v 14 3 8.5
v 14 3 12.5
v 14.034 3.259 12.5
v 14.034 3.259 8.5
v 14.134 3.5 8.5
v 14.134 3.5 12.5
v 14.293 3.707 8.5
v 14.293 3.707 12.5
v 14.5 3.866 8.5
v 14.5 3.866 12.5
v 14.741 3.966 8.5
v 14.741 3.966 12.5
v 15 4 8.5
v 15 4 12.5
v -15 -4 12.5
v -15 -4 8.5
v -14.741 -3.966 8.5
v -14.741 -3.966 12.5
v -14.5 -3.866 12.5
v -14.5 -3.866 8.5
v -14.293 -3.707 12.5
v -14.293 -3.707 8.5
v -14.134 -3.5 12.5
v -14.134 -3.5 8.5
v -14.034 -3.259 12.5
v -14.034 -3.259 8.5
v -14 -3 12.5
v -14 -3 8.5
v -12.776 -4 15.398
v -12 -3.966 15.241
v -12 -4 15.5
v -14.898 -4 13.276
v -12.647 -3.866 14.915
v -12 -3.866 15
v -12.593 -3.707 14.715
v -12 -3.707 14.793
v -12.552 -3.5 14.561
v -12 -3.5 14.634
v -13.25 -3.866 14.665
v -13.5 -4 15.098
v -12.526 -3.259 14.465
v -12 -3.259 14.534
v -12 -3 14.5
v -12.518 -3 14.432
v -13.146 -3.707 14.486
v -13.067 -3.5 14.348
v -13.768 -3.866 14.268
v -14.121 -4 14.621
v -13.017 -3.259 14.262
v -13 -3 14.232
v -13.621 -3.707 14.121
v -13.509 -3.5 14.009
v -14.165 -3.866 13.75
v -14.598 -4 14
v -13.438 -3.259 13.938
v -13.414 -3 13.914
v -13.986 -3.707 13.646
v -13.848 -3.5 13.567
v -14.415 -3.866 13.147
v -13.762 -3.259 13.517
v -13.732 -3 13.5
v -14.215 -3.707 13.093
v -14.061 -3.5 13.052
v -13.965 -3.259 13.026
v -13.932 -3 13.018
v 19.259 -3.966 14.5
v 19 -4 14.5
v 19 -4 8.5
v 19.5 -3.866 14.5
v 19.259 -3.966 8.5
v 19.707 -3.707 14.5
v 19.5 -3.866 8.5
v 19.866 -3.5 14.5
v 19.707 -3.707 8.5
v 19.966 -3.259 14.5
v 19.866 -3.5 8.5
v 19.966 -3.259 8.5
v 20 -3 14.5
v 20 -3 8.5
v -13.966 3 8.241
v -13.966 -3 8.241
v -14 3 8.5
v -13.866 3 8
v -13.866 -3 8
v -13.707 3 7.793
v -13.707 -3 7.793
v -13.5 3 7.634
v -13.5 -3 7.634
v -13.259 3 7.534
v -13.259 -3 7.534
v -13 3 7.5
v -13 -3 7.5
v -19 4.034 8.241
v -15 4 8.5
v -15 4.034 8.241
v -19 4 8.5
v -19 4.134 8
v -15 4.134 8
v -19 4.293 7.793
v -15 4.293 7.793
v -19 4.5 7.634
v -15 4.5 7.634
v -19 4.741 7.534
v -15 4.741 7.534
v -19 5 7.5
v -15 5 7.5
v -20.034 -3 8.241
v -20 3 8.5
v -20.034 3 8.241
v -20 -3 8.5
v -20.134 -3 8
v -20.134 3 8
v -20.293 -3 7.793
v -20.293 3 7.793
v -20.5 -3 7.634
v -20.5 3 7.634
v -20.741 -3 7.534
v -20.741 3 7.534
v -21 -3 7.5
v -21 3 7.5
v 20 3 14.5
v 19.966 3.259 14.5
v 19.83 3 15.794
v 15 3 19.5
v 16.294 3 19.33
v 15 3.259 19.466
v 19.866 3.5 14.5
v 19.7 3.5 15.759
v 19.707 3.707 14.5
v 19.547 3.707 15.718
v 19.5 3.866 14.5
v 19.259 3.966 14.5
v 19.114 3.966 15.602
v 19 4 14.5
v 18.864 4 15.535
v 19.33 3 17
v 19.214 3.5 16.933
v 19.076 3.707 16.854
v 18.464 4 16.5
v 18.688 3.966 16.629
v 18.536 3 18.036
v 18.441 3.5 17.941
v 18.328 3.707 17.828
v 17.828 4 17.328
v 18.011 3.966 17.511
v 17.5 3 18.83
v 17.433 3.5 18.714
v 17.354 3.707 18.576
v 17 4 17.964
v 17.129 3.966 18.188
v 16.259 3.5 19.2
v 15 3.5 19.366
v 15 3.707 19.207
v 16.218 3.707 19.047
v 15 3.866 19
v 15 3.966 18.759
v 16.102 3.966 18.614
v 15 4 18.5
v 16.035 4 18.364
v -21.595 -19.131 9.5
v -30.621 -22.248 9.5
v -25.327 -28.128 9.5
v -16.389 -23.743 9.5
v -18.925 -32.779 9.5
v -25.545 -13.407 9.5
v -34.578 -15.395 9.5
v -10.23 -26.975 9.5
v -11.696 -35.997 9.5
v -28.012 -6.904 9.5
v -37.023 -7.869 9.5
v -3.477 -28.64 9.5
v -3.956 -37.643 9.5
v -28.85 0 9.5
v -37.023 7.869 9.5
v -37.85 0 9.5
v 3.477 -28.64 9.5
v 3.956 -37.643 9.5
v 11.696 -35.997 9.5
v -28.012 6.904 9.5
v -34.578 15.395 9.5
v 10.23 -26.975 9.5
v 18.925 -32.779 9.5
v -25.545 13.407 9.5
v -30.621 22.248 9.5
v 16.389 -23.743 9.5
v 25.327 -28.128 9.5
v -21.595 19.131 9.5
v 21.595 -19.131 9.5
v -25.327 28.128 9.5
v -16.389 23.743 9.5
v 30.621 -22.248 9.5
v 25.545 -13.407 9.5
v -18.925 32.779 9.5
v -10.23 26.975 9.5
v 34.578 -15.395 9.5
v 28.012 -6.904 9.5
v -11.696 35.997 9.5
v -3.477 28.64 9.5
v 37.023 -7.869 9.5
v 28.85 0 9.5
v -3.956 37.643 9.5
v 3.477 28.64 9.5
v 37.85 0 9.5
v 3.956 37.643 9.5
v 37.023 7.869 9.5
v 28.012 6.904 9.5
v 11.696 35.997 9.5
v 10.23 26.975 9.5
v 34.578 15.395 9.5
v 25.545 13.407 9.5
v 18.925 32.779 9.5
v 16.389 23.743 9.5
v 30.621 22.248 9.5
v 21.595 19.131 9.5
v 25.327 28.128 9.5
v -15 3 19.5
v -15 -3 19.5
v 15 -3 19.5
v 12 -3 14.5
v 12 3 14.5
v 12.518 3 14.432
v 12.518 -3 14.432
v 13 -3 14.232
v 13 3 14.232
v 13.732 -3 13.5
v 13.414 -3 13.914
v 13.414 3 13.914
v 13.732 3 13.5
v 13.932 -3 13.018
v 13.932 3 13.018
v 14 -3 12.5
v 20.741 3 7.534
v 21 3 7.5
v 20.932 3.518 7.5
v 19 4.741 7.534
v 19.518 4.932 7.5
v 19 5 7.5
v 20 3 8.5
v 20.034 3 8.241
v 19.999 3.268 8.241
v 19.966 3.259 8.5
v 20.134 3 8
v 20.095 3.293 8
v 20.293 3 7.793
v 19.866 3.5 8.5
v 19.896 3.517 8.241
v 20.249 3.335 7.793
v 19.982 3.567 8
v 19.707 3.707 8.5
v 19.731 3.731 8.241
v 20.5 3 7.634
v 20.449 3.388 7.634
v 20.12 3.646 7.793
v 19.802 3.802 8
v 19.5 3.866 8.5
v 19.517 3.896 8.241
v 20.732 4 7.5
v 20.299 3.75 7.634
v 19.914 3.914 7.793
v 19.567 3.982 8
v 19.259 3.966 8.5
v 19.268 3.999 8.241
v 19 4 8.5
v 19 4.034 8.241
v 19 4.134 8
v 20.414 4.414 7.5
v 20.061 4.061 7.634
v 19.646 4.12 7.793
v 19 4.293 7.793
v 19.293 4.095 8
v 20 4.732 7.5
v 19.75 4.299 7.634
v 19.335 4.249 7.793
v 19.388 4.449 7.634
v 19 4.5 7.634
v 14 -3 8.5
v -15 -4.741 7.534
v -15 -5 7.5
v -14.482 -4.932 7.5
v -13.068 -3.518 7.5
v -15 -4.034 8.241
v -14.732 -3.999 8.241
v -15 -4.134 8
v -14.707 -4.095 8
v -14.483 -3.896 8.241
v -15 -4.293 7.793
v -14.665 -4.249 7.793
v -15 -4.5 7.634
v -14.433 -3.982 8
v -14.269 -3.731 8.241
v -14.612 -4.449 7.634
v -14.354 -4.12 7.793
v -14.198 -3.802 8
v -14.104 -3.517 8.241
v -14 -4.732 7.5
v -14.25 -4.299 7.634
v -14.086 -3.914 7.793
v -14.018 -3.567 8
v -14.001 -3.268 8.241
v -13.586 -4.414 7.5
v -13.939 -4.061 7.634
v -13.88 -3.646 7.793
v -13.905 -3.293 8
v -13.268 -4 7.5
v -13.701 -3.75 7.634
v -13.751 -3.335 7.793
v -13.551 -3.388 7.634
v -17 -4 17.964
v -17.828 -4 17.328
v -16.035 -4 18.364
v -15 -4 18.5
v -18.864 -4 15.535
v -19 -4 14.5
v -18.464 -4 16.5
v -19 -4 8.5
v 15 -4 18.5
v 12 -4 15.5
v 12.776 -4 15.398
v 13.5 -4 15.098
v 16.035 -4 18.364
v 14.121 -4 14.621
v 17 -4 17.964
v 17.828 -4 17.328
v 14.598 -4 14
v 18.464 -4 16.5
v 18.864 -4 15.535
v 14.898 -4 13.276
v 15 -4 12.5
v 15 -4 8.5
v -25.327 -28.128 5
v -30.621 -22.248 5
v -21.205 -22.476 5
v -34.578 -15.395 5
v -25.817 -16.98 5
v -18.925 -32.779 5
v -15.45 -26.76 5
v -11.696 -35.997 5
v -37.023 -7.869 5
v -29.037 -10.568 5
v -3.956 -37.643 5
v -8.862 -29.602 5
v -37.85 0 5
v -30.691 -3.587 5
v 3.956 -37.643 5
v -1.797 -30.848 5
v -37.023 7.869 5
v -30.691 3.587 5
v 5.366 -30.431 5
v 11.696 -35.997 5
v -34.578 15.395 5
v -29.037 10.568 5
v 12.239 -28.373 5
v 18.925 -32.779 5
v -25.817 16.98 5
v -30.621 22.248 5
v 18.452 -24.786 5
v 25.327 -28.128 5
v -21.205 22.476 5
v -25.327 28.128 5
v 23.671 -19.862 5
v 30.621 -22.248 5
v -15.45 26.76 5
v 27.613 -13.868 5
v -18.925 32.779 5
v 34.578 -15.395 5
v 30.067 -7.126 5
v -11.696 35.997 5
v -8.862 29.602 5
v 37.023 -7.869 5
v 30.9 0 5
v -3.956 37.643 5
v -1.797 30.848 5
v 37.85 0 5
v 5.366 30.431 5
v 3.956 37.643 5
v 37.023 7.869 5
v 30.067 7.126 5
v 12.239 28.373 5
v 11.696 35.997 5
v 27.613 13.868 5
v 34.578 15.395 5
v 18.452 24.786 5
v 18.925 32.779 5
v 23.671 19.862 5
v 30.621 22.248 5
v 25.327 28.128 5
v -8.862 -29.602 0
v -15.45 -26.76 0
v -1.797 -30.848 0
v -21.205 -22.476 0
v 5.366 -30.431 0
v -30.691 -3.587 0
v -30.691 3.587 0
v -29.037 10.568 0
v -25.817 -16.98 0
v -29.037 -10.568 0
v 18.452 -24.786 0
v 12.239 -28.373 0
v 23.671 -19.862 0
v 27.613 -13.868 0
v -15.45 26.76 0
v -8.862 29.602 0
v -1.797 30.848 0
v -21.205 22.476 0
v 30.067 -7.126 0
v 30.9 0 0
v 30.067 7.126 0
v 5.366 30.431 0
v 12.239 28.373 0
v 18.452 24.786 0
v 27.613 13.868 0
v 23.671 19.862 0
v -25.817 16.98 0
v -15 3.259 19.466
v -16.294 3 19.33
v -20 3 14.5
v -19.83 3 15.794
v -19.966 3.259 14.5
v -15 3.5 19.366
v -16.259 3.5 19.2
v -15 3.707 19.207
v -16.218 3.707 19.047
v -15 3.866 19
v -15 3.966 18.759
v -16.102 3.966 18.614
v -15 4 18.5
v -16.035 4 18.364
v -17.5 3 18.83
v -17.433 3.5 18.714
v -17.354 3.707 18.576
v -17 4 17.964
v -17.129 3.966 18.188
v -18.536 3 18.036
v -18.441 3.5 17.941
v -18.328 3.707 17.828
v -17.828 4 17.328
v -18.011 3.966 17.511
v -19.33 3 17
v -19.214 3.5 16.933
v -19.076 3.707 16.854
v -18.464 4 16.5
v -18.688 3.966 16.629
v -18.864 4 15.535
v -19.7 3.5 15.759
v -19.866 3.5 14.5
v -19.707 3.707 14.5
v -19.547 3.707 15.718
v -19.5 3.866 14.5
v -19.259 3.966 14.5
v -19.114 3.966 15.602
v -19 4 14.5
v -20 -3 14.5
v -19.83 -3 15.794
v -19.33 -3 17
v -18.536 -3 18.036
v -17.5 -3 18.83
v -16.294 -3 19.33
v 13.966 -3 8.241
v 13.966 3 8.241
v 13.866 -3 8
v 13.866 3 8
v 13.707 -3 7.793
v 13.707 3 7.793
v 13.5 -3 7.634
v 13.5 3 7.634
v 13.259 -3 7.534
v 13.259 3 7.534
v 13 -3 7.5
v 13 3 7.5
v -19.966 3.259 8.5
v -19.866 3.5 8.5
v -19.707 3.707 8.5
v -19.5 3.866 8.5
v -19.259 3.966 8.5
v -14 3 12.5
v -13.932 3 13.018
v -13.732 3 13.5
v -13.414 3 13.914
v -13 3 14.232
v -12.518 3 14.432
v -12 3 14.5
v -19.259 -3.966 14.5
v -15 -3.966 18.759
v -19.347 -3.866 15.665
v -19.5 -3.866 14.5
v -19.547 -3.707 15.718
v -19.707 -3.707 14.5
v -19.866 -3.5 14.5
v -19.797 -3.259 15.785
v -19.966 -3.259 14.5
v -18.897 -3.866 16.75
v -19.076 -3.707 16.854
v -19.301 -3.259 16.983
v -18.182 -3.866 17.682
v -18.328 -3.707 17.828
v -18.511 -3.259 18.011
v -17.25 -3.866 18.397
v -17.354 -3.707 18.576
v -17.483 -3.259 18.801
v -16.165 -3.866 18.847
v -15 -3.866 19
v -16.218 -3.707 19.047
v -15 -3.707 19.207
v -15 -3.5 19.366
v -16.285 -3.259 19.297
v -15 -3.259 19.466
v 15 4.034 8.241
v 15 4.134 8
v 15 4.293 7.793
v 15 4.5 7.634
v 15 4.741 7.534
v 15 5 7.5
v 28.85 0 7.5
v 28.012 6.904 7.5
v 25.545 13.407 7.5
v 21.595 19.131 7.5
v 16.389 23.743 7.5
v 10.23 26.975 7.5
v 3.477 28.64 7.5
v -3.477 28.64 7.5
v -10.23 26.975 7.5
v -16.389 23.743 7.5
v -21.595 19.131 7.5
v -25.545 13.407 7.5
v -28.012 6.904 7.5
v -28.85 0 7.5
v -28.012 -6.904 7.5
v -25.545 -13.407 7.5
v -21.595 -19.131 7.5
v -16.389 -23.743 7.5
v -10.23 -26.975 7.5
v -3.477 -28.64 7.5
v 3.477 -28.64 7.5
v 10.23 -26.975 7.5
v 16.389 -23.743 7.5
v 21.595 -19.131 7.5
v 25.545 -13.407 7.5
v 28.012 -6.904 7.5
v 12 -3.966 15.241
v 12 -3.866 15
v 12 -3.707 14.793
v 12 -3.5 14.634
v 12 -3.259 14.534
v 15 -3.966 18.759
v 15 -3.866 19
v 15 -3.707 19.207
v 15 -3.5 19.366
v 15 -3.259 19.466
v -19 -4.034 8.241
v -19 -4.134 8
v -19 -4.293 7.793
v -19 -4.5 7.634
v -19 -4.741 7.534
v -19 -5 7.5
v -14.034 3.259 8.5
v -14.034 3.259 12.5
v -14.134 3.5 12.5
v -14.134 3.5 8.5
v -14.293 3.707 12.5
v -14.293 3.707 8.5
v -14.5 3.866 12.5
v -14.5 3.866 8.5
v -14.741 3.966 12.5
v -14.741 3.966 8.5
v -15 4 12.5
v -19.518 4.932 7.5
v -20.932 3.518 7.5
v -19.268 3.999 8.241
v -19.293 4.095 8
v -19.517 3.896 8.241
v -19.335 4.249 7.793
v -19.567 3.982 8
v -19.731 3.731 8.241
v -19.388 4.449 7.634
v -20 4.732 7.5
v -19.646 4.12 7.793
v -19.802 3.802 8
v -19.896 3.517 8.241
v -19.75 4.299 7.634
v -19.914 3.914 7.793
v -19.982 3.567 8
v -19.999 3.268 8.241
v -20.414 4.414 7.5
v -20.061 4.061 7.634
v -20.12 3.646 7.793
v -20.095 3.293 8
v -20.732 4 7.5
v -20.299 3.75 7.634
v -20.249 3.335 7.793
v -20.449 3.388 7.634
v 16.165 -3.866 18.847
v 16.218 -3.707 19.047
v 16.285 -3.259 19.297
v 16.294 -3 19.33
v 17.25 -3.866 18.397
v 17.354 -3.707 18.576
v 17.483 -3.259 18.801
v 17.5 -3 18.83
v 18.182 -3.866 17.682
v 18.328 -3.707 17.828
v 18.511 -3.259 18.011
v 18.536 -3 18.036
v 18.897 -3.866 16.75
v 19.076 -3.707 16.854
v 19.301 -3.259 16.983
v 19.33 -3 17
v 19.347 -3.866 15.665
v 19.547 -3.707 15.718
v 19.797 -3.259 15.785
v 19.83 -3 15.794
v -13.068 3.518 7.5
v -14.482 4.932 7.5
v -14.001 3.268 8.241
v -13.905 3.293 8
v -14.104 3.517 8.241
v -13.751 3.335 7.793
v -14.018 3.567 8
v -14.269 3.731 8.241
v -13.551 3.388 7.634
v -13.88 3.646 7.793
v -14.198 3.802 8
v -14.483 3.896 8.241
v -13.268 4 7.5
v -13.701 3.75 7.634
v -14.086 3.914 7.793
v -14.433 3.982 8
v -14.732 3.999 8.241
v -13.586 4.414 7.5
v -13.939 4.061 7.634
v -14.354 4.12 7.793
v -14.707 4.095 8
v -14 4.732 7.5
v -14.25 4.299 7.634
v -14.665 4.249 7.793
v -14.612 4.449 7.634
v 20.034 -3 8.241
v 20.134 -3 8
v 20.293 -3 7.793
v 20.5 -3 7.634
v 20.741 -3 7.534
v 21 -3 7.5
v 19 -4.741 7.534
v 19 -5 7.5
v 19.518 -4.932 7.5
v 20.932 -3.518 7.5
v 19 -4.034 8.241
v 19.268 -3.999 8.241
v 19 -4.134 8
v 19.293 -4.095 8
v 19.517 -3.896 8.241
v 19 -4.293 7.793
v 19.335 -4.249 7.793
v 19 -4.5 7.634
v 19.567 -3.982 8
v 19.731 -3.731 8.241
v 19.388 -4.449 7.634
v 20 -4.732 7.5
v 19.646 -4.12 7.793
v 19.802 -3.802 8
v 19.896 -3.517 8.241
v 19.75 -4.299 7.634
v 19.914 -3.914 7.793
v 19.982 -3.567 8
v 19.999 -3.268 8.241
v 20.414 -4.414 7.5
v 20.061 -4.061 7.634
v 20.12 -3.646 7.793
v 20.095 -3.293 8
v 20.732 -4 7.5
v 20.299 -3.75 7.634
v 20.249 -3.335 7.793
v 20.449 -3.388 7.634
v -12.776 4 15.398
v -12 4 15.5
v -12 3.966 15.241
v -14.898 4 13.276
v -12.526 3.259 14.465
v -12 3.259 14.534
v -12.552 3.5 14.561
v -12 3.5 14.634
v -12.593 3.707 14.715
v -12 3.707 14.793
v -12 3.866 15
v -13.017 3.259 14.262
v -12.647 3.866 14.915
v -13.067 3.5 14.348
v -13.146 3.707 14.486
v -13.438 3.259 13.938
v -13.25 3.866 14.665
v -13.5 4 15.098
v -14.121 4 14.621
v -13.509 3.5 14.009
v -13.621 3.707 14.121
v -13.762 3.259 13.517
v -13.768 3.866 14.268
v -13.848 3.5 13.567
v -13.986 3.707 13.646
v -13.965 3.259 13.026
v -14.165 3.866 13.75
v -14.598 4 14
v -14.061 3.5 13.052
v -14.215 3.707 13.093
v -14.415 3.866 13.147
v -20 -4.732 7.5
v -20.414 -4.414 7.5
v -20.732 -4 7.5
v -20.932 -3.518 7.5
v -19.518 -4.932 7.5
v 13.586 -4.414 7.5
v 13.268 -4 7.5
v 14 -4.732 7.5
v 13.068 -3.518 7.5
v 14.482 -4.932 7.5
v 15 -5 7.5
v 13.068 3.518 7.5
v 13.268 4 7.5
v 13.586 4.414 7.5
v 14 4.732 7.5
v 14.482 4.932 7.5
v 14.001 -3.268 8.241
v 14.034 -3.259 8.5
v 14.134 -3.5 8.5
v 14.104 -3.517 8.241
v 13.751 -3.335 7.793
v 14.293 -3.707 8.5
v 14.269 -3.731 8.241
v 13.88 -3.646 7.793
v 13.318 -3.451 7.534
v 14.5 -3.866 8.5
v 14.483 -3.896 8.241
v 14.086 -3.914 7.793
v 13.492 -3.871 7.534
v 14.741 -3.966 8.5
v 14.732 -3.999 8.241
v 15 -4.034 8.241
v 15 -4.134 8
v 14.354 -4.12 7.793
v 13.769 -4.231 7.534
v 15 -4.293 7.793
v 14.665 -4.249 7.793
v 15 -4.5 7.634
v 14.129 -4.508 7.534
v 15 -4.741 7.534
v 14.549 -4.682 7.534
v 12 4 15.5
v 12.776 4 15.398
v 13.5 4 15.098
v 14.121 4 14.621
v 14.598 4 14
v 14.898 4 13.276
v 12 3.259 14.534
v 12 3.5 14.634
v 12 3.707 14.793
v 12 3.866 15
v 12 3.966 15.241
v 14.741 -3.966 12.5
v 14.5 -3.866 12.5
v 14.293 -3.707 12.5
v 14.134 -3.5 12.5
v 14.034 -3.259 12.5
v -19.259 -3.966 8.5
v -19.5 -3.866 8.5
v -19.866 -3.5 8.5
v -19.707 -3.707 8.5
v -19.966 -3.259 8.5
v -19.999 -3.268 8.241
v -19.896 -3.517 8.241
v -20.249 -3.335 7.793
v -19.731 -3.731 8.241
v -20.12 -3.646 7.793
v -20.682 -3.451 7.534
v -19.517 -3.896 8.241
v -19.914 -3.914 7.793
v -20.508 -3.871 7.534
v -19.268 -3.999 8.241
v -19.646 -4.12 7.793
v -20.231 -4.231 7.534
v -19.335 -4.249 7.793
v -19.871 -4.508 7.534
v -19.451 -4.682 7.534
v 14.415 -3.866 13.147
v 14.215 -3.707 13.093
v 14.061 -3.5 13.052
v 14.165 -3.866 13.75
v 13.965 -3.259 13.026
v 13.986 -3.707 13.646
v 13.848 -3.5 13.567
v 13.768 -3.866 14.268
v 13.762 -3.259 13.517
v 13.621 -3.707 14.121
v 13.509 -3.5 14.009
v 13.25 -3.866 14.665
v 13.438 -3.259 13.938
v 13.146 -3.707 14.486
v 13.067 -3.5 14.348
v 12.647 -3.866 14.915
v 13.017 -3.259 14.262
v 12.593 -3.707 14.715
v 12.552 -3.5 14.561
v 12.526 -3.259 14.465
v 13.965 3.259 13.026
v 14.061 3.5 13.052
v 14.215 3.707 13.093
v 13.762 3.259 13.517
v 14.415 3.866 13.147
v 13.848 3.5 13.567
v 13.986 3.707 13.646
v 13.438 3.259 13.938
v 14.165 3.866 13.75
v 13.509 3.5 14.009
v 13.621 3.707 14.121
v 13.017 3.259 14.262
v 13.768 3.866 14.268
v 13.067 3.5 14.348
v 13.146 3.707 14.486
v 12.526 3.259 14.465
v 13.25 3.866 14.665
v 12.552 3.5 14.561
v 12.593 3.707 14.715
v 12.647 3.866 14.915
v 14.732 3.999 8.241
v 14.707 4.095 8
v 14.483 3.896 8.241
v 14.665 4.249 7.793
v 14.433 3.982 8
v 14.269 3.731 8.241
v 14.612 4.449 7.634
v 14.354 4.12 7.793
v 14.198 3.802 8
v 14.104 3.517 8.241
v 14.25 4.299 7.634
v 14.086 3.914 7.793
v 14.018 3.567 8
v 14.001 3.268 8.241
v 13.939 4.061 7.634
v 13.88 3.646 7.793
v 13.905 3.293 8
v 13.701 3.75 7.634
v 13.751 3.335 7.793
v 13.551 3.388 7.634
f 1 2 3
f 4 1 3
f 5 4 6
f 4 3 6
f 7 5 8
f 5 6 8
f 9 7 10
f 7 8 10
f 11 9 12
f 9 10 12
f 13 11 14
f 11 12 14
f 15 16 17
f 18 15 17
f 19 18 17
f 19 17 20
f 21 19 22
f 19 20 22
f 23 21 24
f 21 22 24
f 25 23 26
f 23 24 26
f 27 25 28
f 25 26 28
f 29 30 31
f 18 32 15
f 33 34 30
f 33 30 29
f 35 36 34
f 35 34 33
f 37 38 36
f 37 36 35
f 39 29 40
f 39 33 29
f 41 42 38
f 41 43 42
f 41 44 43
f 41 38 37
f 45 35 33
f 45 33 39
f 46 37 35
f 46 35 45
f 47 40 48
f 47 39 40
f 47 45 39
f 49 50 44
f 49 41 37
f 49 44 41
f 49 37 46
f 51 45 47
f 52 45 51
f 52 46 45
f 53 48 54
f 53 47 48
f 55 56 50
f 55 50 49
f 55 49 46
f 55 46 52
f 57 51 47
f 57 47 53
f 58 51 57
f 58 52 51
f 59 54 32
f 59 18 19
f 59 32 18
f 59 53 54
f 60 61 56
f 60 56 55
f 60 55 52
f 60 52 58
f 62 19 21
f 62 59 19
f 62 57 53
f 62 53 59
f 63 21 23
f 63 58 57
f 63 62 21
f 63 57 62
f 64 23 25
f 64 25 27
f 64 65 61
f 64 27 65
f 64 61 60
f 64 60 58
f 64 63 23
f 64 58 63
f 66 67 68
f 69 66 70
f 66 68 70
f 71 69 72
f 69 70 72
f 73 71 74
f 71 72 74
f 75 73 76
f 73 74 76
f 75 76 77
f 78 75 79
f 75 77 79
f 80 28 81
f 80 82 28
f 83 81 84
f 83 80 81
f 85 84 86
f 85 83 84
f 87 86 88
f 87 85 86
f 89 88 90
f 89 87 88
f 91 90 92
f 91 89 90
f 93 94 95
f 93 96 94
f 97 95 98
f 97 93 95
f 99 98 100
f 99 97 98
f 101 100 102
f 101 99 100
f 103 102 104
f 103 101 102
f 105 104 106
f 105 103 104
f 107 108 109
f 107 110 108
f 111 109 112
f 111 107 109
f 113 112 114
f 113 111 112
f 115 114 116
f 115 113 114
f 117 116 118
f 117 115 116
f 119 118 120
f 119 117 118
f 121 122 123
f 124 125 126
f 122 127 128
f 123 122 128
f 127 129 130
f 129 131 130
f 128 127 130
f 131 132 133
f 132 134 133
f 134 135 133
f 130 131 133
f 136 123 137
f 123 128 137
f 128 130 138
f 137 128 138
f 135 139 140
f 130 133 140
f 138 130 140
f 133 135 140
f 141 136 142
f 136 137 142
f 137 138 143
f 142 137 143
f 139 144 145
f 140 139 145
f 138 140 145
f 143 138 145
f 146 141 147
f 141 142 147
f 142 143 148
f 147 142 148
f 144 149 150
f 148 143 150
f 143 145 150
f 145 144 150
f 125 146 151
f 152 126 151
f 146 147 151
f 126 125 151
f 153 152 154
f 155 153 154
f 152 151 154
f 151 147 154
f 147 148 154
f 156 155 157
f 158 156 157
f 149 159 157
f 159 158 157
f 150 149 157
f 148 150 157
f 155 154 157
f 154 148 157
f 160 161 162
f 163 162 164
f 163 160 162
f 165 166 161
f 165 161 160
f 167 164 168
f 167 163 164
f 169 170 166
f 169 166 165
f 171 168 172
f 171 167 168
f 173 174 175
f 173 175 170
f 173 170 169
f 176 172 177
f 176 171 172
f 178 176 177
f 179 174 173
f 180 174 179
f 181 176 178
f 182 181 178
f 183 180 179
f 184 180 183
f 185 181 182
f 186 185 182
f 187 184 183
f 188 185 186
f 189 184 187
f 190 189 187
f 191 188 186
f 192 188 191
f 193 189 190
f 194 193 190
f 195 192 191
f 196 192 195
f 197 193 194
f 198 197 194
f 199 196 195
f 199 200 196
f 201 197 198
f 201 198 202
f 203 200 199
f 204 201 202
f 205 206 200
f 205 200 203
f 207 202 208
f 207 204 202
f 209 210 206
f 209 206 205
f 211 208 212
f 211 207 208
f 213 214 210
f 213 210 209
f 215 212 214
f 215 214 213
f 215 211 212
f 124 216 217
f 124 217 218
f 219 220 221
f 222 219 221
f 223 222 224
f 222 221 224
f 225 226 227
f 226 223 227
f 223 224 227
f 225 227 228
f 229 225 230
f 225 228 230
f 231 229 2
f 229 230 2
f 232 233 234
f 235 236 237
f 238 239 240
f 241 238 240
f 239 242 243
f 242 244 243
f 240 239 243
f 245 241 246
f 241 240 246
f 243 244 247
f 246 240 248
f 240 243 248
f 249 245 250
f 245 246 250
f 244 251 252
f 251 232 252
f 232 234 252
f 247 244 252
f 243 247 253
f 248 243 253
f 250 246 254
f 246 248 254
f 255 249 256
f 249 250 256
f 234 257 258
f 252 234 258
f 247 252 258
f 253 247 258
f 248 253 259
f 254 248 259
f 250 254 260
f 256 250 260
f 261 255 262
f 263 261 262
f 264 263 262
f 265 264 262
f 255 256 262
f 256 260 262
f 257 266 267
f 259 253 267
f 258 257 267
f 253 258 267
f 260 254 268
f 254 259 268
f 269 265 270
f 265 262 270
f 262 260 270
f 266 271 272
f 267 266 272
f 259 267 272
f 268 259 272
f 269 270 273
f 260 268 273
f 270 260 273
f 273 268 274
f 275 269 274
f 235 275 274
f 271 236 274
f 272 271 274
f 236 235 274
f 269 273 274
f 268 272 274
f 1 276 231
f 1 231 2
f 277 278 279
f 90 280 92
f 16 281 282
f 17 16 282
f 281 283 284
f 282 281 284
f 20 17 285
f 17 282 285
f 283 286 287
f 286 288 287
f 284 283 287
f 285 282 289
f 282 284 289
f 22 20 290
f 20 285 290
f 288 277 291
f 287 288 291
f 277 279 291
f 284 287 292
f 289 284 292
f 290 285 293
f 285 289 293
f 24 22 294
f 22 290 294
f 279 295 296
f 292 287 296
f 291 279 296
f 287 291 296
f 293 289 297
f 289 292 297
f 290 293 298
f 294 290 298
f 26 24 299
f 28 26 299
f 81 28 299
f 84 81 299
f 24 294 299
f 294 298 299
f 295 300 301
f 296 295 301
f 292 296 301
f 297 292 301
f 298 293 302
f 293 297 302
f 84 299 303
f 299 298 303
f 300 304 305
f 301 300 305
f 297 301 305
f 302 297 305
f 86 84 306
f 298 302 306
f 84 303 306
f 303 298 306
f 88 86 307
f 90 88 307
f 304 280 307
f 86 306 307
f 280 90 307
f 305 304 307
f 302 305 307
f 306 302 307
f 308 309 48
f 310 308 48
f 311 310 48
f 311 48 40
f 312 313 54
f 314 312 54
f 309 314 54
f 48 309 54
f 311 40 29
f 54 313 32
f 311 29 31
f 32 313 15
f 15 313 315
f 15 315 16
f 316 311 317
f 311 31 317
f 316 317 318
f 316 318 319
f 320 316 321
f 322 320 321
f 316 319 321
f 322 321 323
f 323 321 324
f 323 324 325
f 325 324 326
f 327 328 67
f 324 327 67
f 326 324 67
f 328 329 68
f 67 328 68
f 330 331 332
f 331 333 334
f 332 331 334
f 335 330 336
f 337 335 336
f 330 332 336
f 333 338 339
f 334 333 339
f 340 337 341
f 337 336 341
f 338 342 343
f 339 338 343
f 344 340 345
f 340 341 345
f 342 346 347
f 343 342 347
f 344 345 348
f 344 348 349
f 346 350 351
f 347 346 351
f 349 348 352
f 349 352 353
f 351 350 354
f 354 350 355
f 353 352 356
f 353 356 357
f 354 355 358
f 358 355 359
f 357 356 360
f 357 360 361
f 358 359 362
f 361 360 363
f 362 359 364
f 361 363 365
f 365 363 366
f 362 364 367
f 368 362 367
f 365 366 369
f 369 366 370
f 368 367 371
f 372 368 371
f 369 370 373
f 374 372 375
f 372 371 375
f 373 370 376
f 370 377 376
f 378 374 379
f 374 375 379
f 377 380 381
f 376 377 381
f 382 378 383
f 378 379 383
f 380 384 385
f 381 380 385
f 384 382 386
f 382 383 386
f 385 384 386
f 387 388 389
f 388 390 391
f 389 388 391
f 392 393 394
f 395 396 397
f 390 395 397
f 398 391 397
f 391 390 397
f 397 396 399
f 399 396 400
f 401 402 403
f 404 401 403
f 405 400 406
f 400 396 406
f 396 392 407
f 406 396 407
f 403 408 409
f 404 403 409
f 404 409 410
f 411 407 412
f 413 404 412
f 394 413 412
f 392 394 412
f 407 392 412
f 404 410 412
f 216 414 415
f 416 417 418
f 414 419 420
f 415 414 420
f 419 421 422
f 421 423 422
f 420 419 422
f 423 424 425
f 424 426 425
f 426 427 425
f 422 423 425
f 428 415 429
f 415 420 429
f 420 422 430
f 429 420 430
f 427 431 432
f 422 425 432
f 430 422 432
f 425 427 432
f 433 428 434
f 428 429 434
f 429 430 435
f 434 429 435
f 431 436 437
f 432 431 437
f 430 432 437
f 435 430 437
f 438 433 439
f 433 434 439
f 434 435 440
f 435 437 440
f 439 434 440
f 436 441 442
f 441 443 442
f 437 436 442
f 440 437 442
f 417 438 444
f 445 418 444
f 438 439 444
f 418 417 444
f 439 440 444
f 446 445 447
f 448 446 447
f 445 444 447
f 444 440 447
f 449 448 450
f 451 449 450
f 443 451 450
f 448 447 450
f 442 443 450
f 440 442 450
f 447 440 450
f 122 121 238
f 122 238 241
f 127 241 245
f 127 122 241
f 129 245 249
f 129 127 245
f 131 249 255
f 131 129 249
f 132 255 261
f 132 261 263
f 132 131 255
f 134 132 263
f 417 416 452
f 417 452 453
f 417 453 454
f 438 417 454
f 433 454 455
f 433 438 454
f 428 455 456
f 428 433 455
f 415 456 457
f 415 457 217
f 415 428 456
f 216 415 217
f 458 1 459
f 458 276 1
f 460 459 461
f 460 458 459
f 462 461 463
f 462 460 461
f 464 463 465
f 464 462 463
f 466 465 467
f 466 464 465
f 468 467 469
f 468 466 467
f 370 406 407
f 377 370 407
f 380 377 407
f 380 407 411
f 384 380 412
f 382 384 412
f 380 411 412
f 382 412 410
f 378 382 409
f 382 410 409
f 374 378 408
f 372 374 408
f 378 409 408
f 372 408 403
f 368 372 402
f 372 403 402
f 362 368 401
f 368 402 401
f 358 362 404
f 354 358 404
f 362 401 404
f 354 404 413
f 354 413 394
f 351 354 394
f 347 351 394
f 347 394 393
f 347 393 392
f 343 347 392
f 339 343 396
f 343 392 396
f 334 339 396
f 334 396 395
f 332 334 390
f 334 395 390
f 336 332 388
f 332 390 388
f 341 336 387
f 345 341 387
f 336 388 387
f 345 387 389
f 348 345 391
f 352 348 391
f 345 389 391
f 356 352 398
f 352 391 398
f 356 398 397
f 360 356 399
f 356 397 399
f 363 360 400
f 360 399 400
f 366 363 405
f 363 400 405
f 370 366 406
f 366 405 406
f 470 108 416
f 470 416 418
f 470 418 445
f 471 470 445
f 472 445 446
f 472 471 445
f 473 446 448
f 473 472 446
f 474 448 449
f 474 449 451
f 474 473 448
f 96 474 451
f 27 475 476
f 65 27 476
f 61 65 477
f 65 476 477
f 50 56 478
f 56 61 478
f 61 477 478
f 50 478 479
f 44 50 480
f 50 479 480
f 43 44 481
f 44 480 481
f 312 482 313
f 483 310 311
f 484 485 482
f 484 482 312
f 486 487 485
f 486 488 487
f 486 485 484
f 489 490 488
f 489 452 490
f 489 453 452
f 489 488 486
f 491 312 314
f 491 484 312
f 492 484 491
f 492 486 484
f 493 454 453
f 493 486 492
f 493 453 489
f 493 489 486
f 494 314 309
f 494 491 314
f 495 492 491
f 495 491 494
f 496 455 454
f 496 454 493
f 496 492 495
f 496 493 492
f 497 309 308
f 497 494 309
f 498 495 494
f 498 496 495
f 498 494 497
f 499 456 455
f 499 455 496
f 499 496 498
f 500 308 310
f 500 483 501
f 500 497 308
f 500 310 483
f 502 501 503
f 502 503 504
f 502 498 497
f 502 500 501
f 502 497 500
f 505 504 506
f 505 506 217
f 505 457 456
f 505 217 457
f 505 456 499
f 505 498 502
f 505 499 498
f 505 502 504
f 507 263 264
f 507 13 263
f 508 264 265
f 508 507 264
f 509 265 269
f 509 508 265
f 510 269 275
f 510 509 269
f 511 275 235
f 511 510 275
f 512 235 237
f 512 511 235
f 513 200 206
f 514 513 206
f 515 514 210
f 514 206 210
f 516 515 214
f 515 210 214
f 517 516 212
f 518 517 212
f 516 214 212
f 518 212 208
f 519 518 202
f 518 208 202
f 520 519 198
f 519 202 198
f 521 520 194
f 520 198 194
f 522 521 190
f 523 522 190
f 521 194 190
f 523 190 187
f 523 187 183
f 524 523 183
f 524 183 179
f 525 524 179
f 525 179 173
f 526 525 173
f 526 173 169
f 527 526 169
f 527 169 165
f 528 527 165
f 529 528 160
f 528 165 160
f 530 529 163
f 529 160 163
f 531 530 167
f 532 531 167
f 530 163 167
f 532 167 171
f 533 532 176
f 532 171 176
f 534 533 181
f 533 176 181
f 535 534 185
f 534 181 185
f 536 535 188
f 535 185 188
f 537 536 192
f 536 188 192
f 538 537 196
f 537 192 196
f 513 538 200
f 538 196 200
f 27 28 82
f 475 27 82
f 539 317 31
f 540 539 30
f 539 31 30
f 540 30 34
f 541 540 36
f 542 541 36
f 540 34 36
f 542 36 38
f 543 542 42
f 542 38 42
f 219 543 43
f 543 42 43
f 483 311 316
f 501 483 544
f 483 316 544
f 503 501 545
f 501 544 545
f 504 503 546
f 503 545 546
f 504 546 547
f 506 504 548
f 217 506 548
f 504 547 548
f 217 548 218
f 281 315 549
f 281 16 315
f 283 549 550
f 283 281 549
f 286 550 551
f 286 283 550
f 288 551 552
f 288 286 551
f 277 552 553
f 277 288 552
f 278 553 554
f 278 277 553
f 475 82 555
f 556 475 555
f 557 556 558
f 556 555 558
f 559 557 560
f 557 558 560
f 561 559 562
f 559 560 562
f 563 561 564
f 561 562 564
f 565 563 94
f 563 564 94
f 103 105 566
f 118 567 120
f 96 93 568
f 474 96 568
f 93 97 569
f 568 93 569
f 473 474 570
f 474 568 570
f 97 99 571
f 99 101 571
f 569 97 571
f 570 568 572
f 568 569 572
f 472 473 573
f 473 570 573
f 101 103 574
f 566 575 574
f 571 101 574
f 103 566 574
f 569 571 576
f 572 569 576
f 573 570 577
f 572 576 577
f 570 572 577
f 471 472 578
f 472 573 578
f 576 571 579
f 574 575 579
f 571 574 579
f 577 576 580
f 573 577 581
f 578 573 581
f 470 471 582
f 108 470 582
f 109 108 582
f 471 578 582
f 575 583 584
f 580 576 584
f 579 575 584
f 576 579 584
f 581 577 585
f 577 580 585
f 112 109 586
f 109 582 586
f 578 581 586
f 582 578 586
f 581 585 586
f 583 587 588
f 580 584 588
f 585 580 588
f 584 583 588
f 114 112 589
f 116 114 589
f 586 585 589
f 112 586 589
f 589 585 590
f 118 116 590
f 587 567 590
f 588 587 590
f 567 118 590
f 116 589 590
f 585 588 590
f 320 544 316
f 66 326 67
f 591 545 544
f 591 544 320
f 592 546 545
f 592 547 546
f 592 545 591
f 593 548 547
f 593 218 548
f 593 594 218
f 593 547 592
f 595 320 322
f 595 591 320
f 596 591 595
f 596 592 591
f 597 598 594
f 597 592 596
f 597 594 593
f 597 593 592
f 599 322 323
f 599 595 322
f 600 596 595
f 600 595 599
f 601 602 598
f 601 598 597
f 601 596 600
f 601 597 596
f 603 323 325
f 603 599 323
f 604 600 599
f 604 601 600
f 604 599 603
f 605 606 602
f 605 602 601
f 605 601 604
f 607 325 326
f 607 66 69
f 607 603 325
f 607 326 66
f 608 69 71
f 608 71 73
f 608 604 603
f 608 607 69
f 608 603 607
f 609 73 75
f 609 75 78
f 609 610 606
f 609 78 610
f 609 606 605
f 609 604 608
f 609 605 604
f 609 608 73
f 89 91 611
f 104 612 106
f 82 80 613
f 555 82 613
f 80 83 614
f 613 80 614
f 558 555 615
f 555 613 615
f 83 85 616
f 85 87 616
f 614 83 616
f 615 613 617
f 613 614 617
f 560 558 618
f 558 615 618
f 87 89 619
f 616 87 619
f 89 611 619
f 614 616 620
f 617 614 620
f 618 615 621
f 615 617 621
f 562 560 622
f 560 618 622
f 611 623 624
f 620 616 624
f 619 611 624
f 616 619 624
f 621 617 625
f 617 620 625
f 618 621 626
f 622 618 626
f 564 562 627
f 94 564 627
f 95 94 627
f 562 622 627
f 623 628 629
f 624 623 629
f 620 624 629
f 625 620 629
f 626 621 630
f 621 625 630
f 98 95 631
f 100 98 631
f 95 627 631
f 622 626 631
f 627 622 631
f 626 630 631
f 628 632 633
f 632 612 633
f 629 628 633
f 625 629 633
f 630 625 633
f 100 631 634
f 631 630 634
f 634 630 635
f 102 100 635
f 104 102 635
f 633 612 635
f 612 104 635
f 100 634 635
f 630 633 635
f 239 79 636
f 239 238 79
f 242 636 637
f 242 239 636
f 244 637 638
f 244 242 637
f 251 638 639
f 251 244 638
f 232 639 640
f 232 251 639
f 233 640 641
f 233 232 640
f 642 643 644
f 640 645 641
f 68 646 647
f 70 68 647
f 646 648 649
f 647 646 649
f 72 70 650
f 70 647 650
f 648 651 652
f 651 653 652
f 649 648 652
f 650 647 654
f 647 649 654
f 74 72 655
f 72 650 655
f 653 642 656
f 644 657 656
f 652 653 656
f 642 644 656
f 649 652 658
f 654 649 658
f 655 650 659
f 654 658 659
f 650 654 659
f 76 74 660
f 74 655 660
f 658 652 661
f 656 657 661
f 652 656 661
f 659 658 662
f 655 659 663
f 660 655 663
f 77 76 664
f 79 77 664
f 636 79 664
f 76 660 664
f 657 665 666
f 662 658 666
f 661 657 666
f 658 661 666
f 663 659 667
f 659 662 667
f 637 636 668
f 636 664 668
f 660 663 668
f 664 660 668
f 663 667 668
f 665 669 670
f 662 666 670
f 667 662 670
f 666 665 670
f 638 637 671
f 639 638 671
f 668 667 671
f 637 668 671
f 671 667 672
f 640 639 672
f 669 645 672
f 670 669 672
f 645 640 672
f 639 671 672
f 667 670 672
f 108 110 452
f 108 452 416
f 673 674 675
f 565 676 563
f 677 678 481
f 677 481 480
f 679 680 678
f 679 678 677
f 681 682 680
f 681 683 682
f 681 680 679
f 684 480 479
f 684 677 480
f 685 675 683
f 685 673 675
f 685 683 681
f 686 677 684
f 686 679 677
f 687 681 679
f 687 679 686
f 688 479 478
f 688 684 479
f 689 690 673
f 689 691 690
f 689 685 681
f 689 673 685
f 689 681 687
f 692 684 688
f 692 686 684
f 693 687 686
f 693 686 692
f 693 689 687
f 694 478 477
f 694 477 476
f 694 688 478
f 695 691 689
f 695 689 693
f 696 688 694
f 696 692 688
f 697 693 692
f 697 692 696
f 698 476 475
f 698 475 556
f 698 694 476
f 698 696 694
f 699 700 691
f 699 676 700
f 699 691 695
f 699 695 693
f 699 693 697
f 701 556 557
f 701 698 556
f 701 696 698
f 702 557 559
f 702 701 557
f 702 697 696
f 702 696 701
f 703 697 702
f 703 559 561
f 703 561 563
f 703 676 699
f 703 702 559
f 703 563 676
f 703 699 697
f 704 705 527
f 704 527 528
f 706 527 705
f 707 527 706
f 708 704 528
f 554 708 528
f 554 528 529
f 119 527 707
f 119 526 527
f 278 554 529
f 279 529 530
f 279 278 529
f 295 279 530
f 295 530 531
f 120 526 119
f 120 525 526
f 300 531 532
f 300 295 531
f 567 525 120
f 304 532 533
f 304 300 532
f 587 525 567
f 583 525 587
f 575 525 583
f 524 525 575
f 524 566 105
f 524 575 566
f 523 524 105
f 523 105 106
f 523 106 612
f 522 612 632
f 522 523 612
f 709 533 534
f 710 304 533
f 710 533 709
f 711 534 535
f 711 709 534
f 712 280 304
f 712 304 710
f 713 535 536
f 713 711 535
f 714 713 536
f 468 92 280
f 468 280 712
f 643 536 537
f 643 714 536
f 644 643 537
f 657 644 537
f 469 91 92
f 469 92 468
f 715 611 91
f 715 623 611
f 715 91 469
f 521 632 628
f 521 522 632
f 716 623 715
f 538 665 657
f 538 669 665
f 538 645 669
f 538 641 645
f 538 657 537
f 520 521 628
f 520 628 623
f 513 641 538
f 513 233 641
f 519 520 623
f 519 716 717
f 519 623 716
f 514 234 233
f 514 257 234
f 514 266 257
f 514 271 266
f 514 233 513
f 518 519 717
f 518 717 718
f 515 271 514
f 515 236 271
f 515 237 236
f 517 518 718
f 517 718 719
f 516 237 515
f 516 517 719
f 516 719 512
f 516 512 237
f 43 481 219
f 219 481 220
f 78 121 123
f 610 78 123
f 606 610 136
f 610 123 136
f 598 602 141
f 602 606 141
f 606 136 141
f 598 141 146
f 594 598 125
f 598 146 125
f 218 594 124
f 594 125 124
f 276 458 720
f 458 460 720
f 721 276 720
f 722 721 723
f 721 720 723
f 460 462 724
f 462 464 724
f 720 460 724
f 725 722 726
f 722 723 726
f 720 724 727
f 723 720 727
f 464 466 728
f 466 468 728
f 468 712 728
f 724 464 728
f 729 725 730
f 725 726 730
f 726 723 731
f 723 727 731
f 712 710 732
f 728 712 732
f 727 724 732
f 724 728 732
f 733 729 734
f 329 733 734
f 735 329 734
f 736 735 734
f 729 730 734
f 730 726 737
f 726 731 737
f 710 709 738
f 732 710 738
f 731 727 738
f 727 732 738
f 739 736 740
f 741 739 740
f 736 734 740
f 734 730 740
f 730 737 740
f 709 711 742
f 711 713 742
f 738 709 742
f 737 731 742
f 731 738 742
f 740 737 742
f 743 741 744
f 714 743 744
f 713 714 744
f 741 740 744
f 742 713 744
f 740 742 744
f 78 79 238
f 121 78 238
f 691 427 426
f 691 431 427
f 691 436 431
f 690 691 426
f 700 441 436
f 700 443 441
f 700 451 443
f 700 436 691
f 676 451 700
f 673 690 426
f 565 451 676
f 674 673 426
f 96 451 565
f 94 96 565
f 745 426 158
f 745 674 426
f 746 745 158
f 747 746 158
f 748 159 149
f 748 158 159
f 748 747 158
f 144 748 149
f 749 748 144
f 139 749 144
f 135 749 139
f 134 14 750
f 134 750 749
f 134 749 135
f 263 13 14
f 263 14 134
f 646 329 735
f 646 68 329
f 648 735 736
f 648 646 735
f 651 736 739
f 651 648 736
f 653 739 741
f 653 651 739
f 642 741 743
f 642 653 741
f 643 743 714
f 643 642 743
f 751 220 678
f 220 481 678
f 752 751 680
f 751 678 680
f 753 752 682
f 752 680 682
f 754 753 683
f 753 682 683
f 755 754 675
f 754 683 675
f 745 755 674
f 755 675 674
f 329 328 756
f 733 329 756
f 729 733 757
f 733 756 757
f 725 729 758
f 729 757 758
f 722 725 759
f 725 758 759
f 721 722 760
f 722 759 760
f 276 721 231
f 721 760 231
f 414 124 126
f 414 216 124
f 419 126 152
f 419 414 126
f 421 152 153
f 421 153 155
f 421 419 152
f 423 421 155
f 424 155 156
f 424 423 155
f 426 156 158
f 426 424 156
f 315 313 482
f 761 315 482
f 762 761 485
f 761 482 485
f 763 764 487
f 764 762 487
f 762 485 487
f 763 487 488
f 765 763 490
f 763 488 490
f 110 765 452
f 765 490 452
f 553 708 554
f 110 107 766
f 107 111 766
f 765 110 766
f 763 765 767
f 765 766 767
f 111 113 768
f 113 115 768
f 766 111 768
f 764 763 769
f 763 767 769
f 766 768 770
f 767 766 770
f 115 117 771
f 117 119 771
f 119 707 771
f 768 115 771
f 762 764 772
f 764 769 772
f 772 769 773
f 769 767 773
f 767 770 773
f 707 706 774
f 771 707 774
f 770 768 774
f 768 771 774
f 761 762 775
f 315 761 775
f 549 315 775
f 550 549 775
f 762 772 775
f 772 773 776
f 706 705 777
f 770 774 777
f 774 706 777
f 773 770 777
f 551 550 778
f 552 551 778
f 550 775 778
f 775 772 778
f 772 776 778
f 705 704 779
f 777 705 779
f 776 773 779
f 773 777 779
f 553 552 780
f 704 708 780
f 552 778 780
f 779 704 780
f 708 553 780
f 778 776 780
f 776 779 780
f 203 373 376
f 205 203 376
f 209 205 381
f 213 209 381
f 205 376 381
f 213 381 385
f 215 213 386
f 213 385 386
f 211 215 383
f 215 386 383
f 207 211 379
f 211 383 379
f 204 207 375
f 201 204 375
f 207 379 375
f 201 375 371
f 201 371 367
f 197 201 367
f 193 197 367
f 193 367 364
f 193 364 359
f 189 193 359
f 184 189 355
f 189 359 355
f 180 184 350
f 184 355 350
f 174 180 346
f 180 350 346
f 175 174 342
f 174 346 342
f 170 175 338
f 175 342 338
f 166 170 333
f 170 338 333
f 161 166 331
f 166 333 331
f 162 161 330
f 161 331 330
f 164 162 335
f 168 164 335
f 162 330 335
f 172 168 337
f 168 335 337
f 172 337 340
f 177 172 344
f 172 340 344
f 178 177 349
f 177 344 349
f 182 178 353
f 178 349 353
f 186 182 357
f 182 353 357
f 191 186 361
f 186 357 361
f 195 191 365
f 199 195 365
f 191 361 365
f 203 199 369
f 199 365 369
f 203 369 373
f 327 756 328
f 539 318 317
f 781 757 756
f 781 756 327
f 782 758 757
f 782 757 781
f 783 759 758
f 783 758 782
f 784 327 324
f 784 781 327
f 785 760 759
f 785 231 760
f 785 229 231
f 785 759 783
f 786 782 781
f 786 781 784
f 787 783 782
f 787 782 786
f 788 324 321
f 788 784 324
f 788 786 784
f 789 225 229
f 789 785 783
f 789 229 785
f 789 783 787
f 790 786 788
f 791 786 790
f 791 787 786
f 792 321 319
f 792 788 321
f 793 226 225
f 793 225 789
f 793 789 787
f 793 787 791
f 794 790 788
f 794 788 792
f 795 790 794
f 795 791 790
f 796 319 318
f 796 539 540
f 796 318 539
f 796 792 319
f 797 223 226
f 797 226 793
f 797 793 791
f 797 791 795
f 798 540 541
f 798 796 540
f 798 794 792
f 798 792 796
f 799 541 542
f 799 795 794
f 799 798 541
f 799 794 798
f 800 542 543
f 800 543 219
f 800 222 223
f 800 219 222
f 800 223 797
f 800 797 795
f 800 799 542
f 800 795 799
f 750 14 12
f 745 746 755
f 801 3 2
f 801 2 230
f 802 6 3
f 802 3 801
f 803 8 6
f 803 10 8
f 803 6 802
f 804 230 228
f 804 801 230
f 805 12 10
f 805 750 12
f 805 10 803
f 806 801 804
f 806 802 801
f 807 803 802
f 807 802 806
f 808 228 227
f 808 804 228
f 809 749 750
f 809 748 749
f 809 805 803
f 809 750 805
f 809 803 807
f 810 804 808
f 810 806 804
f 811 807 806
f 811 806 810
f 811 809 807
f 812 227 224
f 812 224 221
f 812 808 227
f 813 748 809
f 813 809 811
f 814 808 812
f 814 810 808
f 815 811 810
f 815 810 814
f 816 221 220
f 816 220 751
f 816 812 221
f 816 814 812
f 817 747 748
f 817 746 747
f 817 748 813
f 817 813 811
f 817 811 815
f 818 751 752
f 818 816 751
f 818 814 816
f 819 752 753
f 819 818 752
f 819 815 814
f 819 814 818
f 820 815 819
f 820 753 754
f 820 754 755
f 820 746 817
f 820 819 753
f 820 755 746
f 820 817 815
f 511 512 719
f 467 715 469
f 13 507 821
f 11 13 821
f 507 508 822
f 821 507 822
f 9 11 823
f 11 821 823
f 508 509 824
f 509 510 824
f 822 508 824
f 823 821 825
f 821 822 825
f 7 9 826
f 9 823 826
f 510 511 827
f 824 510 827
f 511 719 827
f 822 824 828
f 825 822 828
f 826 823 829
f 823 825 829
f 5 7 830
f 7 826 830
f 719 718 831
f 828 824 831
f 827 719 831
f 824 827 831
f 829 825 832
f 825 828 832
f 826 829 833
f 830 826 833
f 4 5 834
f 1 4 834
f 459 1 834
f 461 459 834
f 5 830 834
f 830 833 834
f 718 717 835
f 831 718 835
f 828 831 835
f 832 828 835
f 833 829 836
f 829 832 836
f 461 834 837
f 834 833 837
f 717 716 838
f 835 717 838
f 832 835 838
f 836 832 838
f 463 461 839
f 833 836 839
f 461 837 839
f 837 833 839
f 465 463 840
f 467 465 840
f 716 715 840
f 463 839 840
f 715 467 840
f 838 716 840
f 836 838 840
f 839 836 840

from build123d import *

# Parameters (mm, degrees)
F1_R      = 30.9
F2_DEPTH  = 5
F3_R      = 37.85
F4_DEPTH  = 4.5
F5_R      = 28.85
F6_DEPTH  = 2
F7_W      = 40
F7_H      = 8
F9_DEPTH  = 12
F10_R     = 5
F8_W      = 28
F8_H      = 8
F11_DEPTH = 7
F12_R     = 2
F13_F1_R  = 1
F13_F2_R  = 1


with BuildPart() as f2:
    # F1 (on offset) → F2 (new body)
    with BuildSketch(Plane.XY):
        Circle(F1_R)
    extrude(amount=F2_DEPTH)

    # F3 (on face) → F4 (join)
    with BuildSketch(Plane.XY.offset(5)):
        Circle(F3_R)
    extrude(amount=F4_DEPTH)

    # F5 (on face) → F6 (cut)
    with BuildSketch(Plane.XY.offset(9.5)):
        Circle(F5_R)
    extrude(amount=-F6_DEPTH, mode=Mode.SUBTRACT)

    # F7 (on face) → F9 (join)
    with BuildSketch(Plane.XY.offset(7.5)):
        Rectangle(F7_W, F7_H)
    extrude(amount=F9_DEPTH)

    # F10
    f10_edges = [f2.edges().sort_by_distance(p)[0] for p in [
        (-20, 0, 19.5),
        (20, 0, 19.5),
    ]]
    fillet(f10_edges, radius=F10_R)

    # F8 (on face) → F11 (cut)
    with BuildSketch(Plane.XY.offset(7.5)):
        Rectangle(F8_W, F8_H)
    extrude(amount=F11_DEPTH, mode=Mode.SUBTRACT)

    # F12
    f12_edges = [f2.edges().sort_by_distance(p)[0] for p in [
        (-14, 0, 14.5),
        (14, 0, 14.5),
    ]]
    fillet(f12_edges, radius=F12_R)

    # F13: fillet of radius 1 on 24 edges, made by hand

    # F13_f1
    f13_f1_edges = [f2.edges().sort_by_distance(p)[0] for p in [
        (0, -4, 19.5),
        (14, -4, 10),
        (13.4142135624, -4, 13.9142135624),
        (0, -4, 14.5),
        (-13.4142135624, -4, 13.9142135624),
        (-14, -4, 10),
        (-20, -4, 11),
        (-18.5355339059, -4, 18.0355339059),
        (18.5355339059, -4, 18.0355339059),
        (20, -4, 11),
        (14, 4, 10),
        (13.4142135624, 4, 13.9142135624),
        (0, 4, 14.5),
        (20, 4, 11),
        (-13.4142135624, 4, 13.9142135624),
        (18.5355339059, 4, 18.0355339059),
        (-14, 4, 10),
        (0, 4, 19.5),
        (-18.5355339059, 4, 18.0355339059),
        (-20, 4, 11),
    ]]
    fillet(f13_f1_edges, radius=F13_F1_R)

    # F13_f2
    f13_f2_edges = [f2.edges().sort_by_distance(p)[0] for p in [
        (-17, -4, 7.5),
        (17, -4, 7.5),
        (17, 4, 7.5),
        (-17, 4, 7.5),
        (-14.2928932188, 3.7071067812, 7.5),
        (-19.7071067812, 3.7071067812, 7.5),
        (19.7071067812, 3.7071067812, 7.5),
        (14.2928932188, 3.7071067812, 7.5),
        (14.2928932188, -3.7071067812, 7.5),
        (19.7071067812, -3.7071067812, 7.5),
        (-19.7071067812, -3.7071067812, 7.5),
        (-14.2928932188, -3.7071067812, 7.5),
    ]]
    fillet(f13_f2_edges, radius=F13_F2_R)


solid = f2.part
